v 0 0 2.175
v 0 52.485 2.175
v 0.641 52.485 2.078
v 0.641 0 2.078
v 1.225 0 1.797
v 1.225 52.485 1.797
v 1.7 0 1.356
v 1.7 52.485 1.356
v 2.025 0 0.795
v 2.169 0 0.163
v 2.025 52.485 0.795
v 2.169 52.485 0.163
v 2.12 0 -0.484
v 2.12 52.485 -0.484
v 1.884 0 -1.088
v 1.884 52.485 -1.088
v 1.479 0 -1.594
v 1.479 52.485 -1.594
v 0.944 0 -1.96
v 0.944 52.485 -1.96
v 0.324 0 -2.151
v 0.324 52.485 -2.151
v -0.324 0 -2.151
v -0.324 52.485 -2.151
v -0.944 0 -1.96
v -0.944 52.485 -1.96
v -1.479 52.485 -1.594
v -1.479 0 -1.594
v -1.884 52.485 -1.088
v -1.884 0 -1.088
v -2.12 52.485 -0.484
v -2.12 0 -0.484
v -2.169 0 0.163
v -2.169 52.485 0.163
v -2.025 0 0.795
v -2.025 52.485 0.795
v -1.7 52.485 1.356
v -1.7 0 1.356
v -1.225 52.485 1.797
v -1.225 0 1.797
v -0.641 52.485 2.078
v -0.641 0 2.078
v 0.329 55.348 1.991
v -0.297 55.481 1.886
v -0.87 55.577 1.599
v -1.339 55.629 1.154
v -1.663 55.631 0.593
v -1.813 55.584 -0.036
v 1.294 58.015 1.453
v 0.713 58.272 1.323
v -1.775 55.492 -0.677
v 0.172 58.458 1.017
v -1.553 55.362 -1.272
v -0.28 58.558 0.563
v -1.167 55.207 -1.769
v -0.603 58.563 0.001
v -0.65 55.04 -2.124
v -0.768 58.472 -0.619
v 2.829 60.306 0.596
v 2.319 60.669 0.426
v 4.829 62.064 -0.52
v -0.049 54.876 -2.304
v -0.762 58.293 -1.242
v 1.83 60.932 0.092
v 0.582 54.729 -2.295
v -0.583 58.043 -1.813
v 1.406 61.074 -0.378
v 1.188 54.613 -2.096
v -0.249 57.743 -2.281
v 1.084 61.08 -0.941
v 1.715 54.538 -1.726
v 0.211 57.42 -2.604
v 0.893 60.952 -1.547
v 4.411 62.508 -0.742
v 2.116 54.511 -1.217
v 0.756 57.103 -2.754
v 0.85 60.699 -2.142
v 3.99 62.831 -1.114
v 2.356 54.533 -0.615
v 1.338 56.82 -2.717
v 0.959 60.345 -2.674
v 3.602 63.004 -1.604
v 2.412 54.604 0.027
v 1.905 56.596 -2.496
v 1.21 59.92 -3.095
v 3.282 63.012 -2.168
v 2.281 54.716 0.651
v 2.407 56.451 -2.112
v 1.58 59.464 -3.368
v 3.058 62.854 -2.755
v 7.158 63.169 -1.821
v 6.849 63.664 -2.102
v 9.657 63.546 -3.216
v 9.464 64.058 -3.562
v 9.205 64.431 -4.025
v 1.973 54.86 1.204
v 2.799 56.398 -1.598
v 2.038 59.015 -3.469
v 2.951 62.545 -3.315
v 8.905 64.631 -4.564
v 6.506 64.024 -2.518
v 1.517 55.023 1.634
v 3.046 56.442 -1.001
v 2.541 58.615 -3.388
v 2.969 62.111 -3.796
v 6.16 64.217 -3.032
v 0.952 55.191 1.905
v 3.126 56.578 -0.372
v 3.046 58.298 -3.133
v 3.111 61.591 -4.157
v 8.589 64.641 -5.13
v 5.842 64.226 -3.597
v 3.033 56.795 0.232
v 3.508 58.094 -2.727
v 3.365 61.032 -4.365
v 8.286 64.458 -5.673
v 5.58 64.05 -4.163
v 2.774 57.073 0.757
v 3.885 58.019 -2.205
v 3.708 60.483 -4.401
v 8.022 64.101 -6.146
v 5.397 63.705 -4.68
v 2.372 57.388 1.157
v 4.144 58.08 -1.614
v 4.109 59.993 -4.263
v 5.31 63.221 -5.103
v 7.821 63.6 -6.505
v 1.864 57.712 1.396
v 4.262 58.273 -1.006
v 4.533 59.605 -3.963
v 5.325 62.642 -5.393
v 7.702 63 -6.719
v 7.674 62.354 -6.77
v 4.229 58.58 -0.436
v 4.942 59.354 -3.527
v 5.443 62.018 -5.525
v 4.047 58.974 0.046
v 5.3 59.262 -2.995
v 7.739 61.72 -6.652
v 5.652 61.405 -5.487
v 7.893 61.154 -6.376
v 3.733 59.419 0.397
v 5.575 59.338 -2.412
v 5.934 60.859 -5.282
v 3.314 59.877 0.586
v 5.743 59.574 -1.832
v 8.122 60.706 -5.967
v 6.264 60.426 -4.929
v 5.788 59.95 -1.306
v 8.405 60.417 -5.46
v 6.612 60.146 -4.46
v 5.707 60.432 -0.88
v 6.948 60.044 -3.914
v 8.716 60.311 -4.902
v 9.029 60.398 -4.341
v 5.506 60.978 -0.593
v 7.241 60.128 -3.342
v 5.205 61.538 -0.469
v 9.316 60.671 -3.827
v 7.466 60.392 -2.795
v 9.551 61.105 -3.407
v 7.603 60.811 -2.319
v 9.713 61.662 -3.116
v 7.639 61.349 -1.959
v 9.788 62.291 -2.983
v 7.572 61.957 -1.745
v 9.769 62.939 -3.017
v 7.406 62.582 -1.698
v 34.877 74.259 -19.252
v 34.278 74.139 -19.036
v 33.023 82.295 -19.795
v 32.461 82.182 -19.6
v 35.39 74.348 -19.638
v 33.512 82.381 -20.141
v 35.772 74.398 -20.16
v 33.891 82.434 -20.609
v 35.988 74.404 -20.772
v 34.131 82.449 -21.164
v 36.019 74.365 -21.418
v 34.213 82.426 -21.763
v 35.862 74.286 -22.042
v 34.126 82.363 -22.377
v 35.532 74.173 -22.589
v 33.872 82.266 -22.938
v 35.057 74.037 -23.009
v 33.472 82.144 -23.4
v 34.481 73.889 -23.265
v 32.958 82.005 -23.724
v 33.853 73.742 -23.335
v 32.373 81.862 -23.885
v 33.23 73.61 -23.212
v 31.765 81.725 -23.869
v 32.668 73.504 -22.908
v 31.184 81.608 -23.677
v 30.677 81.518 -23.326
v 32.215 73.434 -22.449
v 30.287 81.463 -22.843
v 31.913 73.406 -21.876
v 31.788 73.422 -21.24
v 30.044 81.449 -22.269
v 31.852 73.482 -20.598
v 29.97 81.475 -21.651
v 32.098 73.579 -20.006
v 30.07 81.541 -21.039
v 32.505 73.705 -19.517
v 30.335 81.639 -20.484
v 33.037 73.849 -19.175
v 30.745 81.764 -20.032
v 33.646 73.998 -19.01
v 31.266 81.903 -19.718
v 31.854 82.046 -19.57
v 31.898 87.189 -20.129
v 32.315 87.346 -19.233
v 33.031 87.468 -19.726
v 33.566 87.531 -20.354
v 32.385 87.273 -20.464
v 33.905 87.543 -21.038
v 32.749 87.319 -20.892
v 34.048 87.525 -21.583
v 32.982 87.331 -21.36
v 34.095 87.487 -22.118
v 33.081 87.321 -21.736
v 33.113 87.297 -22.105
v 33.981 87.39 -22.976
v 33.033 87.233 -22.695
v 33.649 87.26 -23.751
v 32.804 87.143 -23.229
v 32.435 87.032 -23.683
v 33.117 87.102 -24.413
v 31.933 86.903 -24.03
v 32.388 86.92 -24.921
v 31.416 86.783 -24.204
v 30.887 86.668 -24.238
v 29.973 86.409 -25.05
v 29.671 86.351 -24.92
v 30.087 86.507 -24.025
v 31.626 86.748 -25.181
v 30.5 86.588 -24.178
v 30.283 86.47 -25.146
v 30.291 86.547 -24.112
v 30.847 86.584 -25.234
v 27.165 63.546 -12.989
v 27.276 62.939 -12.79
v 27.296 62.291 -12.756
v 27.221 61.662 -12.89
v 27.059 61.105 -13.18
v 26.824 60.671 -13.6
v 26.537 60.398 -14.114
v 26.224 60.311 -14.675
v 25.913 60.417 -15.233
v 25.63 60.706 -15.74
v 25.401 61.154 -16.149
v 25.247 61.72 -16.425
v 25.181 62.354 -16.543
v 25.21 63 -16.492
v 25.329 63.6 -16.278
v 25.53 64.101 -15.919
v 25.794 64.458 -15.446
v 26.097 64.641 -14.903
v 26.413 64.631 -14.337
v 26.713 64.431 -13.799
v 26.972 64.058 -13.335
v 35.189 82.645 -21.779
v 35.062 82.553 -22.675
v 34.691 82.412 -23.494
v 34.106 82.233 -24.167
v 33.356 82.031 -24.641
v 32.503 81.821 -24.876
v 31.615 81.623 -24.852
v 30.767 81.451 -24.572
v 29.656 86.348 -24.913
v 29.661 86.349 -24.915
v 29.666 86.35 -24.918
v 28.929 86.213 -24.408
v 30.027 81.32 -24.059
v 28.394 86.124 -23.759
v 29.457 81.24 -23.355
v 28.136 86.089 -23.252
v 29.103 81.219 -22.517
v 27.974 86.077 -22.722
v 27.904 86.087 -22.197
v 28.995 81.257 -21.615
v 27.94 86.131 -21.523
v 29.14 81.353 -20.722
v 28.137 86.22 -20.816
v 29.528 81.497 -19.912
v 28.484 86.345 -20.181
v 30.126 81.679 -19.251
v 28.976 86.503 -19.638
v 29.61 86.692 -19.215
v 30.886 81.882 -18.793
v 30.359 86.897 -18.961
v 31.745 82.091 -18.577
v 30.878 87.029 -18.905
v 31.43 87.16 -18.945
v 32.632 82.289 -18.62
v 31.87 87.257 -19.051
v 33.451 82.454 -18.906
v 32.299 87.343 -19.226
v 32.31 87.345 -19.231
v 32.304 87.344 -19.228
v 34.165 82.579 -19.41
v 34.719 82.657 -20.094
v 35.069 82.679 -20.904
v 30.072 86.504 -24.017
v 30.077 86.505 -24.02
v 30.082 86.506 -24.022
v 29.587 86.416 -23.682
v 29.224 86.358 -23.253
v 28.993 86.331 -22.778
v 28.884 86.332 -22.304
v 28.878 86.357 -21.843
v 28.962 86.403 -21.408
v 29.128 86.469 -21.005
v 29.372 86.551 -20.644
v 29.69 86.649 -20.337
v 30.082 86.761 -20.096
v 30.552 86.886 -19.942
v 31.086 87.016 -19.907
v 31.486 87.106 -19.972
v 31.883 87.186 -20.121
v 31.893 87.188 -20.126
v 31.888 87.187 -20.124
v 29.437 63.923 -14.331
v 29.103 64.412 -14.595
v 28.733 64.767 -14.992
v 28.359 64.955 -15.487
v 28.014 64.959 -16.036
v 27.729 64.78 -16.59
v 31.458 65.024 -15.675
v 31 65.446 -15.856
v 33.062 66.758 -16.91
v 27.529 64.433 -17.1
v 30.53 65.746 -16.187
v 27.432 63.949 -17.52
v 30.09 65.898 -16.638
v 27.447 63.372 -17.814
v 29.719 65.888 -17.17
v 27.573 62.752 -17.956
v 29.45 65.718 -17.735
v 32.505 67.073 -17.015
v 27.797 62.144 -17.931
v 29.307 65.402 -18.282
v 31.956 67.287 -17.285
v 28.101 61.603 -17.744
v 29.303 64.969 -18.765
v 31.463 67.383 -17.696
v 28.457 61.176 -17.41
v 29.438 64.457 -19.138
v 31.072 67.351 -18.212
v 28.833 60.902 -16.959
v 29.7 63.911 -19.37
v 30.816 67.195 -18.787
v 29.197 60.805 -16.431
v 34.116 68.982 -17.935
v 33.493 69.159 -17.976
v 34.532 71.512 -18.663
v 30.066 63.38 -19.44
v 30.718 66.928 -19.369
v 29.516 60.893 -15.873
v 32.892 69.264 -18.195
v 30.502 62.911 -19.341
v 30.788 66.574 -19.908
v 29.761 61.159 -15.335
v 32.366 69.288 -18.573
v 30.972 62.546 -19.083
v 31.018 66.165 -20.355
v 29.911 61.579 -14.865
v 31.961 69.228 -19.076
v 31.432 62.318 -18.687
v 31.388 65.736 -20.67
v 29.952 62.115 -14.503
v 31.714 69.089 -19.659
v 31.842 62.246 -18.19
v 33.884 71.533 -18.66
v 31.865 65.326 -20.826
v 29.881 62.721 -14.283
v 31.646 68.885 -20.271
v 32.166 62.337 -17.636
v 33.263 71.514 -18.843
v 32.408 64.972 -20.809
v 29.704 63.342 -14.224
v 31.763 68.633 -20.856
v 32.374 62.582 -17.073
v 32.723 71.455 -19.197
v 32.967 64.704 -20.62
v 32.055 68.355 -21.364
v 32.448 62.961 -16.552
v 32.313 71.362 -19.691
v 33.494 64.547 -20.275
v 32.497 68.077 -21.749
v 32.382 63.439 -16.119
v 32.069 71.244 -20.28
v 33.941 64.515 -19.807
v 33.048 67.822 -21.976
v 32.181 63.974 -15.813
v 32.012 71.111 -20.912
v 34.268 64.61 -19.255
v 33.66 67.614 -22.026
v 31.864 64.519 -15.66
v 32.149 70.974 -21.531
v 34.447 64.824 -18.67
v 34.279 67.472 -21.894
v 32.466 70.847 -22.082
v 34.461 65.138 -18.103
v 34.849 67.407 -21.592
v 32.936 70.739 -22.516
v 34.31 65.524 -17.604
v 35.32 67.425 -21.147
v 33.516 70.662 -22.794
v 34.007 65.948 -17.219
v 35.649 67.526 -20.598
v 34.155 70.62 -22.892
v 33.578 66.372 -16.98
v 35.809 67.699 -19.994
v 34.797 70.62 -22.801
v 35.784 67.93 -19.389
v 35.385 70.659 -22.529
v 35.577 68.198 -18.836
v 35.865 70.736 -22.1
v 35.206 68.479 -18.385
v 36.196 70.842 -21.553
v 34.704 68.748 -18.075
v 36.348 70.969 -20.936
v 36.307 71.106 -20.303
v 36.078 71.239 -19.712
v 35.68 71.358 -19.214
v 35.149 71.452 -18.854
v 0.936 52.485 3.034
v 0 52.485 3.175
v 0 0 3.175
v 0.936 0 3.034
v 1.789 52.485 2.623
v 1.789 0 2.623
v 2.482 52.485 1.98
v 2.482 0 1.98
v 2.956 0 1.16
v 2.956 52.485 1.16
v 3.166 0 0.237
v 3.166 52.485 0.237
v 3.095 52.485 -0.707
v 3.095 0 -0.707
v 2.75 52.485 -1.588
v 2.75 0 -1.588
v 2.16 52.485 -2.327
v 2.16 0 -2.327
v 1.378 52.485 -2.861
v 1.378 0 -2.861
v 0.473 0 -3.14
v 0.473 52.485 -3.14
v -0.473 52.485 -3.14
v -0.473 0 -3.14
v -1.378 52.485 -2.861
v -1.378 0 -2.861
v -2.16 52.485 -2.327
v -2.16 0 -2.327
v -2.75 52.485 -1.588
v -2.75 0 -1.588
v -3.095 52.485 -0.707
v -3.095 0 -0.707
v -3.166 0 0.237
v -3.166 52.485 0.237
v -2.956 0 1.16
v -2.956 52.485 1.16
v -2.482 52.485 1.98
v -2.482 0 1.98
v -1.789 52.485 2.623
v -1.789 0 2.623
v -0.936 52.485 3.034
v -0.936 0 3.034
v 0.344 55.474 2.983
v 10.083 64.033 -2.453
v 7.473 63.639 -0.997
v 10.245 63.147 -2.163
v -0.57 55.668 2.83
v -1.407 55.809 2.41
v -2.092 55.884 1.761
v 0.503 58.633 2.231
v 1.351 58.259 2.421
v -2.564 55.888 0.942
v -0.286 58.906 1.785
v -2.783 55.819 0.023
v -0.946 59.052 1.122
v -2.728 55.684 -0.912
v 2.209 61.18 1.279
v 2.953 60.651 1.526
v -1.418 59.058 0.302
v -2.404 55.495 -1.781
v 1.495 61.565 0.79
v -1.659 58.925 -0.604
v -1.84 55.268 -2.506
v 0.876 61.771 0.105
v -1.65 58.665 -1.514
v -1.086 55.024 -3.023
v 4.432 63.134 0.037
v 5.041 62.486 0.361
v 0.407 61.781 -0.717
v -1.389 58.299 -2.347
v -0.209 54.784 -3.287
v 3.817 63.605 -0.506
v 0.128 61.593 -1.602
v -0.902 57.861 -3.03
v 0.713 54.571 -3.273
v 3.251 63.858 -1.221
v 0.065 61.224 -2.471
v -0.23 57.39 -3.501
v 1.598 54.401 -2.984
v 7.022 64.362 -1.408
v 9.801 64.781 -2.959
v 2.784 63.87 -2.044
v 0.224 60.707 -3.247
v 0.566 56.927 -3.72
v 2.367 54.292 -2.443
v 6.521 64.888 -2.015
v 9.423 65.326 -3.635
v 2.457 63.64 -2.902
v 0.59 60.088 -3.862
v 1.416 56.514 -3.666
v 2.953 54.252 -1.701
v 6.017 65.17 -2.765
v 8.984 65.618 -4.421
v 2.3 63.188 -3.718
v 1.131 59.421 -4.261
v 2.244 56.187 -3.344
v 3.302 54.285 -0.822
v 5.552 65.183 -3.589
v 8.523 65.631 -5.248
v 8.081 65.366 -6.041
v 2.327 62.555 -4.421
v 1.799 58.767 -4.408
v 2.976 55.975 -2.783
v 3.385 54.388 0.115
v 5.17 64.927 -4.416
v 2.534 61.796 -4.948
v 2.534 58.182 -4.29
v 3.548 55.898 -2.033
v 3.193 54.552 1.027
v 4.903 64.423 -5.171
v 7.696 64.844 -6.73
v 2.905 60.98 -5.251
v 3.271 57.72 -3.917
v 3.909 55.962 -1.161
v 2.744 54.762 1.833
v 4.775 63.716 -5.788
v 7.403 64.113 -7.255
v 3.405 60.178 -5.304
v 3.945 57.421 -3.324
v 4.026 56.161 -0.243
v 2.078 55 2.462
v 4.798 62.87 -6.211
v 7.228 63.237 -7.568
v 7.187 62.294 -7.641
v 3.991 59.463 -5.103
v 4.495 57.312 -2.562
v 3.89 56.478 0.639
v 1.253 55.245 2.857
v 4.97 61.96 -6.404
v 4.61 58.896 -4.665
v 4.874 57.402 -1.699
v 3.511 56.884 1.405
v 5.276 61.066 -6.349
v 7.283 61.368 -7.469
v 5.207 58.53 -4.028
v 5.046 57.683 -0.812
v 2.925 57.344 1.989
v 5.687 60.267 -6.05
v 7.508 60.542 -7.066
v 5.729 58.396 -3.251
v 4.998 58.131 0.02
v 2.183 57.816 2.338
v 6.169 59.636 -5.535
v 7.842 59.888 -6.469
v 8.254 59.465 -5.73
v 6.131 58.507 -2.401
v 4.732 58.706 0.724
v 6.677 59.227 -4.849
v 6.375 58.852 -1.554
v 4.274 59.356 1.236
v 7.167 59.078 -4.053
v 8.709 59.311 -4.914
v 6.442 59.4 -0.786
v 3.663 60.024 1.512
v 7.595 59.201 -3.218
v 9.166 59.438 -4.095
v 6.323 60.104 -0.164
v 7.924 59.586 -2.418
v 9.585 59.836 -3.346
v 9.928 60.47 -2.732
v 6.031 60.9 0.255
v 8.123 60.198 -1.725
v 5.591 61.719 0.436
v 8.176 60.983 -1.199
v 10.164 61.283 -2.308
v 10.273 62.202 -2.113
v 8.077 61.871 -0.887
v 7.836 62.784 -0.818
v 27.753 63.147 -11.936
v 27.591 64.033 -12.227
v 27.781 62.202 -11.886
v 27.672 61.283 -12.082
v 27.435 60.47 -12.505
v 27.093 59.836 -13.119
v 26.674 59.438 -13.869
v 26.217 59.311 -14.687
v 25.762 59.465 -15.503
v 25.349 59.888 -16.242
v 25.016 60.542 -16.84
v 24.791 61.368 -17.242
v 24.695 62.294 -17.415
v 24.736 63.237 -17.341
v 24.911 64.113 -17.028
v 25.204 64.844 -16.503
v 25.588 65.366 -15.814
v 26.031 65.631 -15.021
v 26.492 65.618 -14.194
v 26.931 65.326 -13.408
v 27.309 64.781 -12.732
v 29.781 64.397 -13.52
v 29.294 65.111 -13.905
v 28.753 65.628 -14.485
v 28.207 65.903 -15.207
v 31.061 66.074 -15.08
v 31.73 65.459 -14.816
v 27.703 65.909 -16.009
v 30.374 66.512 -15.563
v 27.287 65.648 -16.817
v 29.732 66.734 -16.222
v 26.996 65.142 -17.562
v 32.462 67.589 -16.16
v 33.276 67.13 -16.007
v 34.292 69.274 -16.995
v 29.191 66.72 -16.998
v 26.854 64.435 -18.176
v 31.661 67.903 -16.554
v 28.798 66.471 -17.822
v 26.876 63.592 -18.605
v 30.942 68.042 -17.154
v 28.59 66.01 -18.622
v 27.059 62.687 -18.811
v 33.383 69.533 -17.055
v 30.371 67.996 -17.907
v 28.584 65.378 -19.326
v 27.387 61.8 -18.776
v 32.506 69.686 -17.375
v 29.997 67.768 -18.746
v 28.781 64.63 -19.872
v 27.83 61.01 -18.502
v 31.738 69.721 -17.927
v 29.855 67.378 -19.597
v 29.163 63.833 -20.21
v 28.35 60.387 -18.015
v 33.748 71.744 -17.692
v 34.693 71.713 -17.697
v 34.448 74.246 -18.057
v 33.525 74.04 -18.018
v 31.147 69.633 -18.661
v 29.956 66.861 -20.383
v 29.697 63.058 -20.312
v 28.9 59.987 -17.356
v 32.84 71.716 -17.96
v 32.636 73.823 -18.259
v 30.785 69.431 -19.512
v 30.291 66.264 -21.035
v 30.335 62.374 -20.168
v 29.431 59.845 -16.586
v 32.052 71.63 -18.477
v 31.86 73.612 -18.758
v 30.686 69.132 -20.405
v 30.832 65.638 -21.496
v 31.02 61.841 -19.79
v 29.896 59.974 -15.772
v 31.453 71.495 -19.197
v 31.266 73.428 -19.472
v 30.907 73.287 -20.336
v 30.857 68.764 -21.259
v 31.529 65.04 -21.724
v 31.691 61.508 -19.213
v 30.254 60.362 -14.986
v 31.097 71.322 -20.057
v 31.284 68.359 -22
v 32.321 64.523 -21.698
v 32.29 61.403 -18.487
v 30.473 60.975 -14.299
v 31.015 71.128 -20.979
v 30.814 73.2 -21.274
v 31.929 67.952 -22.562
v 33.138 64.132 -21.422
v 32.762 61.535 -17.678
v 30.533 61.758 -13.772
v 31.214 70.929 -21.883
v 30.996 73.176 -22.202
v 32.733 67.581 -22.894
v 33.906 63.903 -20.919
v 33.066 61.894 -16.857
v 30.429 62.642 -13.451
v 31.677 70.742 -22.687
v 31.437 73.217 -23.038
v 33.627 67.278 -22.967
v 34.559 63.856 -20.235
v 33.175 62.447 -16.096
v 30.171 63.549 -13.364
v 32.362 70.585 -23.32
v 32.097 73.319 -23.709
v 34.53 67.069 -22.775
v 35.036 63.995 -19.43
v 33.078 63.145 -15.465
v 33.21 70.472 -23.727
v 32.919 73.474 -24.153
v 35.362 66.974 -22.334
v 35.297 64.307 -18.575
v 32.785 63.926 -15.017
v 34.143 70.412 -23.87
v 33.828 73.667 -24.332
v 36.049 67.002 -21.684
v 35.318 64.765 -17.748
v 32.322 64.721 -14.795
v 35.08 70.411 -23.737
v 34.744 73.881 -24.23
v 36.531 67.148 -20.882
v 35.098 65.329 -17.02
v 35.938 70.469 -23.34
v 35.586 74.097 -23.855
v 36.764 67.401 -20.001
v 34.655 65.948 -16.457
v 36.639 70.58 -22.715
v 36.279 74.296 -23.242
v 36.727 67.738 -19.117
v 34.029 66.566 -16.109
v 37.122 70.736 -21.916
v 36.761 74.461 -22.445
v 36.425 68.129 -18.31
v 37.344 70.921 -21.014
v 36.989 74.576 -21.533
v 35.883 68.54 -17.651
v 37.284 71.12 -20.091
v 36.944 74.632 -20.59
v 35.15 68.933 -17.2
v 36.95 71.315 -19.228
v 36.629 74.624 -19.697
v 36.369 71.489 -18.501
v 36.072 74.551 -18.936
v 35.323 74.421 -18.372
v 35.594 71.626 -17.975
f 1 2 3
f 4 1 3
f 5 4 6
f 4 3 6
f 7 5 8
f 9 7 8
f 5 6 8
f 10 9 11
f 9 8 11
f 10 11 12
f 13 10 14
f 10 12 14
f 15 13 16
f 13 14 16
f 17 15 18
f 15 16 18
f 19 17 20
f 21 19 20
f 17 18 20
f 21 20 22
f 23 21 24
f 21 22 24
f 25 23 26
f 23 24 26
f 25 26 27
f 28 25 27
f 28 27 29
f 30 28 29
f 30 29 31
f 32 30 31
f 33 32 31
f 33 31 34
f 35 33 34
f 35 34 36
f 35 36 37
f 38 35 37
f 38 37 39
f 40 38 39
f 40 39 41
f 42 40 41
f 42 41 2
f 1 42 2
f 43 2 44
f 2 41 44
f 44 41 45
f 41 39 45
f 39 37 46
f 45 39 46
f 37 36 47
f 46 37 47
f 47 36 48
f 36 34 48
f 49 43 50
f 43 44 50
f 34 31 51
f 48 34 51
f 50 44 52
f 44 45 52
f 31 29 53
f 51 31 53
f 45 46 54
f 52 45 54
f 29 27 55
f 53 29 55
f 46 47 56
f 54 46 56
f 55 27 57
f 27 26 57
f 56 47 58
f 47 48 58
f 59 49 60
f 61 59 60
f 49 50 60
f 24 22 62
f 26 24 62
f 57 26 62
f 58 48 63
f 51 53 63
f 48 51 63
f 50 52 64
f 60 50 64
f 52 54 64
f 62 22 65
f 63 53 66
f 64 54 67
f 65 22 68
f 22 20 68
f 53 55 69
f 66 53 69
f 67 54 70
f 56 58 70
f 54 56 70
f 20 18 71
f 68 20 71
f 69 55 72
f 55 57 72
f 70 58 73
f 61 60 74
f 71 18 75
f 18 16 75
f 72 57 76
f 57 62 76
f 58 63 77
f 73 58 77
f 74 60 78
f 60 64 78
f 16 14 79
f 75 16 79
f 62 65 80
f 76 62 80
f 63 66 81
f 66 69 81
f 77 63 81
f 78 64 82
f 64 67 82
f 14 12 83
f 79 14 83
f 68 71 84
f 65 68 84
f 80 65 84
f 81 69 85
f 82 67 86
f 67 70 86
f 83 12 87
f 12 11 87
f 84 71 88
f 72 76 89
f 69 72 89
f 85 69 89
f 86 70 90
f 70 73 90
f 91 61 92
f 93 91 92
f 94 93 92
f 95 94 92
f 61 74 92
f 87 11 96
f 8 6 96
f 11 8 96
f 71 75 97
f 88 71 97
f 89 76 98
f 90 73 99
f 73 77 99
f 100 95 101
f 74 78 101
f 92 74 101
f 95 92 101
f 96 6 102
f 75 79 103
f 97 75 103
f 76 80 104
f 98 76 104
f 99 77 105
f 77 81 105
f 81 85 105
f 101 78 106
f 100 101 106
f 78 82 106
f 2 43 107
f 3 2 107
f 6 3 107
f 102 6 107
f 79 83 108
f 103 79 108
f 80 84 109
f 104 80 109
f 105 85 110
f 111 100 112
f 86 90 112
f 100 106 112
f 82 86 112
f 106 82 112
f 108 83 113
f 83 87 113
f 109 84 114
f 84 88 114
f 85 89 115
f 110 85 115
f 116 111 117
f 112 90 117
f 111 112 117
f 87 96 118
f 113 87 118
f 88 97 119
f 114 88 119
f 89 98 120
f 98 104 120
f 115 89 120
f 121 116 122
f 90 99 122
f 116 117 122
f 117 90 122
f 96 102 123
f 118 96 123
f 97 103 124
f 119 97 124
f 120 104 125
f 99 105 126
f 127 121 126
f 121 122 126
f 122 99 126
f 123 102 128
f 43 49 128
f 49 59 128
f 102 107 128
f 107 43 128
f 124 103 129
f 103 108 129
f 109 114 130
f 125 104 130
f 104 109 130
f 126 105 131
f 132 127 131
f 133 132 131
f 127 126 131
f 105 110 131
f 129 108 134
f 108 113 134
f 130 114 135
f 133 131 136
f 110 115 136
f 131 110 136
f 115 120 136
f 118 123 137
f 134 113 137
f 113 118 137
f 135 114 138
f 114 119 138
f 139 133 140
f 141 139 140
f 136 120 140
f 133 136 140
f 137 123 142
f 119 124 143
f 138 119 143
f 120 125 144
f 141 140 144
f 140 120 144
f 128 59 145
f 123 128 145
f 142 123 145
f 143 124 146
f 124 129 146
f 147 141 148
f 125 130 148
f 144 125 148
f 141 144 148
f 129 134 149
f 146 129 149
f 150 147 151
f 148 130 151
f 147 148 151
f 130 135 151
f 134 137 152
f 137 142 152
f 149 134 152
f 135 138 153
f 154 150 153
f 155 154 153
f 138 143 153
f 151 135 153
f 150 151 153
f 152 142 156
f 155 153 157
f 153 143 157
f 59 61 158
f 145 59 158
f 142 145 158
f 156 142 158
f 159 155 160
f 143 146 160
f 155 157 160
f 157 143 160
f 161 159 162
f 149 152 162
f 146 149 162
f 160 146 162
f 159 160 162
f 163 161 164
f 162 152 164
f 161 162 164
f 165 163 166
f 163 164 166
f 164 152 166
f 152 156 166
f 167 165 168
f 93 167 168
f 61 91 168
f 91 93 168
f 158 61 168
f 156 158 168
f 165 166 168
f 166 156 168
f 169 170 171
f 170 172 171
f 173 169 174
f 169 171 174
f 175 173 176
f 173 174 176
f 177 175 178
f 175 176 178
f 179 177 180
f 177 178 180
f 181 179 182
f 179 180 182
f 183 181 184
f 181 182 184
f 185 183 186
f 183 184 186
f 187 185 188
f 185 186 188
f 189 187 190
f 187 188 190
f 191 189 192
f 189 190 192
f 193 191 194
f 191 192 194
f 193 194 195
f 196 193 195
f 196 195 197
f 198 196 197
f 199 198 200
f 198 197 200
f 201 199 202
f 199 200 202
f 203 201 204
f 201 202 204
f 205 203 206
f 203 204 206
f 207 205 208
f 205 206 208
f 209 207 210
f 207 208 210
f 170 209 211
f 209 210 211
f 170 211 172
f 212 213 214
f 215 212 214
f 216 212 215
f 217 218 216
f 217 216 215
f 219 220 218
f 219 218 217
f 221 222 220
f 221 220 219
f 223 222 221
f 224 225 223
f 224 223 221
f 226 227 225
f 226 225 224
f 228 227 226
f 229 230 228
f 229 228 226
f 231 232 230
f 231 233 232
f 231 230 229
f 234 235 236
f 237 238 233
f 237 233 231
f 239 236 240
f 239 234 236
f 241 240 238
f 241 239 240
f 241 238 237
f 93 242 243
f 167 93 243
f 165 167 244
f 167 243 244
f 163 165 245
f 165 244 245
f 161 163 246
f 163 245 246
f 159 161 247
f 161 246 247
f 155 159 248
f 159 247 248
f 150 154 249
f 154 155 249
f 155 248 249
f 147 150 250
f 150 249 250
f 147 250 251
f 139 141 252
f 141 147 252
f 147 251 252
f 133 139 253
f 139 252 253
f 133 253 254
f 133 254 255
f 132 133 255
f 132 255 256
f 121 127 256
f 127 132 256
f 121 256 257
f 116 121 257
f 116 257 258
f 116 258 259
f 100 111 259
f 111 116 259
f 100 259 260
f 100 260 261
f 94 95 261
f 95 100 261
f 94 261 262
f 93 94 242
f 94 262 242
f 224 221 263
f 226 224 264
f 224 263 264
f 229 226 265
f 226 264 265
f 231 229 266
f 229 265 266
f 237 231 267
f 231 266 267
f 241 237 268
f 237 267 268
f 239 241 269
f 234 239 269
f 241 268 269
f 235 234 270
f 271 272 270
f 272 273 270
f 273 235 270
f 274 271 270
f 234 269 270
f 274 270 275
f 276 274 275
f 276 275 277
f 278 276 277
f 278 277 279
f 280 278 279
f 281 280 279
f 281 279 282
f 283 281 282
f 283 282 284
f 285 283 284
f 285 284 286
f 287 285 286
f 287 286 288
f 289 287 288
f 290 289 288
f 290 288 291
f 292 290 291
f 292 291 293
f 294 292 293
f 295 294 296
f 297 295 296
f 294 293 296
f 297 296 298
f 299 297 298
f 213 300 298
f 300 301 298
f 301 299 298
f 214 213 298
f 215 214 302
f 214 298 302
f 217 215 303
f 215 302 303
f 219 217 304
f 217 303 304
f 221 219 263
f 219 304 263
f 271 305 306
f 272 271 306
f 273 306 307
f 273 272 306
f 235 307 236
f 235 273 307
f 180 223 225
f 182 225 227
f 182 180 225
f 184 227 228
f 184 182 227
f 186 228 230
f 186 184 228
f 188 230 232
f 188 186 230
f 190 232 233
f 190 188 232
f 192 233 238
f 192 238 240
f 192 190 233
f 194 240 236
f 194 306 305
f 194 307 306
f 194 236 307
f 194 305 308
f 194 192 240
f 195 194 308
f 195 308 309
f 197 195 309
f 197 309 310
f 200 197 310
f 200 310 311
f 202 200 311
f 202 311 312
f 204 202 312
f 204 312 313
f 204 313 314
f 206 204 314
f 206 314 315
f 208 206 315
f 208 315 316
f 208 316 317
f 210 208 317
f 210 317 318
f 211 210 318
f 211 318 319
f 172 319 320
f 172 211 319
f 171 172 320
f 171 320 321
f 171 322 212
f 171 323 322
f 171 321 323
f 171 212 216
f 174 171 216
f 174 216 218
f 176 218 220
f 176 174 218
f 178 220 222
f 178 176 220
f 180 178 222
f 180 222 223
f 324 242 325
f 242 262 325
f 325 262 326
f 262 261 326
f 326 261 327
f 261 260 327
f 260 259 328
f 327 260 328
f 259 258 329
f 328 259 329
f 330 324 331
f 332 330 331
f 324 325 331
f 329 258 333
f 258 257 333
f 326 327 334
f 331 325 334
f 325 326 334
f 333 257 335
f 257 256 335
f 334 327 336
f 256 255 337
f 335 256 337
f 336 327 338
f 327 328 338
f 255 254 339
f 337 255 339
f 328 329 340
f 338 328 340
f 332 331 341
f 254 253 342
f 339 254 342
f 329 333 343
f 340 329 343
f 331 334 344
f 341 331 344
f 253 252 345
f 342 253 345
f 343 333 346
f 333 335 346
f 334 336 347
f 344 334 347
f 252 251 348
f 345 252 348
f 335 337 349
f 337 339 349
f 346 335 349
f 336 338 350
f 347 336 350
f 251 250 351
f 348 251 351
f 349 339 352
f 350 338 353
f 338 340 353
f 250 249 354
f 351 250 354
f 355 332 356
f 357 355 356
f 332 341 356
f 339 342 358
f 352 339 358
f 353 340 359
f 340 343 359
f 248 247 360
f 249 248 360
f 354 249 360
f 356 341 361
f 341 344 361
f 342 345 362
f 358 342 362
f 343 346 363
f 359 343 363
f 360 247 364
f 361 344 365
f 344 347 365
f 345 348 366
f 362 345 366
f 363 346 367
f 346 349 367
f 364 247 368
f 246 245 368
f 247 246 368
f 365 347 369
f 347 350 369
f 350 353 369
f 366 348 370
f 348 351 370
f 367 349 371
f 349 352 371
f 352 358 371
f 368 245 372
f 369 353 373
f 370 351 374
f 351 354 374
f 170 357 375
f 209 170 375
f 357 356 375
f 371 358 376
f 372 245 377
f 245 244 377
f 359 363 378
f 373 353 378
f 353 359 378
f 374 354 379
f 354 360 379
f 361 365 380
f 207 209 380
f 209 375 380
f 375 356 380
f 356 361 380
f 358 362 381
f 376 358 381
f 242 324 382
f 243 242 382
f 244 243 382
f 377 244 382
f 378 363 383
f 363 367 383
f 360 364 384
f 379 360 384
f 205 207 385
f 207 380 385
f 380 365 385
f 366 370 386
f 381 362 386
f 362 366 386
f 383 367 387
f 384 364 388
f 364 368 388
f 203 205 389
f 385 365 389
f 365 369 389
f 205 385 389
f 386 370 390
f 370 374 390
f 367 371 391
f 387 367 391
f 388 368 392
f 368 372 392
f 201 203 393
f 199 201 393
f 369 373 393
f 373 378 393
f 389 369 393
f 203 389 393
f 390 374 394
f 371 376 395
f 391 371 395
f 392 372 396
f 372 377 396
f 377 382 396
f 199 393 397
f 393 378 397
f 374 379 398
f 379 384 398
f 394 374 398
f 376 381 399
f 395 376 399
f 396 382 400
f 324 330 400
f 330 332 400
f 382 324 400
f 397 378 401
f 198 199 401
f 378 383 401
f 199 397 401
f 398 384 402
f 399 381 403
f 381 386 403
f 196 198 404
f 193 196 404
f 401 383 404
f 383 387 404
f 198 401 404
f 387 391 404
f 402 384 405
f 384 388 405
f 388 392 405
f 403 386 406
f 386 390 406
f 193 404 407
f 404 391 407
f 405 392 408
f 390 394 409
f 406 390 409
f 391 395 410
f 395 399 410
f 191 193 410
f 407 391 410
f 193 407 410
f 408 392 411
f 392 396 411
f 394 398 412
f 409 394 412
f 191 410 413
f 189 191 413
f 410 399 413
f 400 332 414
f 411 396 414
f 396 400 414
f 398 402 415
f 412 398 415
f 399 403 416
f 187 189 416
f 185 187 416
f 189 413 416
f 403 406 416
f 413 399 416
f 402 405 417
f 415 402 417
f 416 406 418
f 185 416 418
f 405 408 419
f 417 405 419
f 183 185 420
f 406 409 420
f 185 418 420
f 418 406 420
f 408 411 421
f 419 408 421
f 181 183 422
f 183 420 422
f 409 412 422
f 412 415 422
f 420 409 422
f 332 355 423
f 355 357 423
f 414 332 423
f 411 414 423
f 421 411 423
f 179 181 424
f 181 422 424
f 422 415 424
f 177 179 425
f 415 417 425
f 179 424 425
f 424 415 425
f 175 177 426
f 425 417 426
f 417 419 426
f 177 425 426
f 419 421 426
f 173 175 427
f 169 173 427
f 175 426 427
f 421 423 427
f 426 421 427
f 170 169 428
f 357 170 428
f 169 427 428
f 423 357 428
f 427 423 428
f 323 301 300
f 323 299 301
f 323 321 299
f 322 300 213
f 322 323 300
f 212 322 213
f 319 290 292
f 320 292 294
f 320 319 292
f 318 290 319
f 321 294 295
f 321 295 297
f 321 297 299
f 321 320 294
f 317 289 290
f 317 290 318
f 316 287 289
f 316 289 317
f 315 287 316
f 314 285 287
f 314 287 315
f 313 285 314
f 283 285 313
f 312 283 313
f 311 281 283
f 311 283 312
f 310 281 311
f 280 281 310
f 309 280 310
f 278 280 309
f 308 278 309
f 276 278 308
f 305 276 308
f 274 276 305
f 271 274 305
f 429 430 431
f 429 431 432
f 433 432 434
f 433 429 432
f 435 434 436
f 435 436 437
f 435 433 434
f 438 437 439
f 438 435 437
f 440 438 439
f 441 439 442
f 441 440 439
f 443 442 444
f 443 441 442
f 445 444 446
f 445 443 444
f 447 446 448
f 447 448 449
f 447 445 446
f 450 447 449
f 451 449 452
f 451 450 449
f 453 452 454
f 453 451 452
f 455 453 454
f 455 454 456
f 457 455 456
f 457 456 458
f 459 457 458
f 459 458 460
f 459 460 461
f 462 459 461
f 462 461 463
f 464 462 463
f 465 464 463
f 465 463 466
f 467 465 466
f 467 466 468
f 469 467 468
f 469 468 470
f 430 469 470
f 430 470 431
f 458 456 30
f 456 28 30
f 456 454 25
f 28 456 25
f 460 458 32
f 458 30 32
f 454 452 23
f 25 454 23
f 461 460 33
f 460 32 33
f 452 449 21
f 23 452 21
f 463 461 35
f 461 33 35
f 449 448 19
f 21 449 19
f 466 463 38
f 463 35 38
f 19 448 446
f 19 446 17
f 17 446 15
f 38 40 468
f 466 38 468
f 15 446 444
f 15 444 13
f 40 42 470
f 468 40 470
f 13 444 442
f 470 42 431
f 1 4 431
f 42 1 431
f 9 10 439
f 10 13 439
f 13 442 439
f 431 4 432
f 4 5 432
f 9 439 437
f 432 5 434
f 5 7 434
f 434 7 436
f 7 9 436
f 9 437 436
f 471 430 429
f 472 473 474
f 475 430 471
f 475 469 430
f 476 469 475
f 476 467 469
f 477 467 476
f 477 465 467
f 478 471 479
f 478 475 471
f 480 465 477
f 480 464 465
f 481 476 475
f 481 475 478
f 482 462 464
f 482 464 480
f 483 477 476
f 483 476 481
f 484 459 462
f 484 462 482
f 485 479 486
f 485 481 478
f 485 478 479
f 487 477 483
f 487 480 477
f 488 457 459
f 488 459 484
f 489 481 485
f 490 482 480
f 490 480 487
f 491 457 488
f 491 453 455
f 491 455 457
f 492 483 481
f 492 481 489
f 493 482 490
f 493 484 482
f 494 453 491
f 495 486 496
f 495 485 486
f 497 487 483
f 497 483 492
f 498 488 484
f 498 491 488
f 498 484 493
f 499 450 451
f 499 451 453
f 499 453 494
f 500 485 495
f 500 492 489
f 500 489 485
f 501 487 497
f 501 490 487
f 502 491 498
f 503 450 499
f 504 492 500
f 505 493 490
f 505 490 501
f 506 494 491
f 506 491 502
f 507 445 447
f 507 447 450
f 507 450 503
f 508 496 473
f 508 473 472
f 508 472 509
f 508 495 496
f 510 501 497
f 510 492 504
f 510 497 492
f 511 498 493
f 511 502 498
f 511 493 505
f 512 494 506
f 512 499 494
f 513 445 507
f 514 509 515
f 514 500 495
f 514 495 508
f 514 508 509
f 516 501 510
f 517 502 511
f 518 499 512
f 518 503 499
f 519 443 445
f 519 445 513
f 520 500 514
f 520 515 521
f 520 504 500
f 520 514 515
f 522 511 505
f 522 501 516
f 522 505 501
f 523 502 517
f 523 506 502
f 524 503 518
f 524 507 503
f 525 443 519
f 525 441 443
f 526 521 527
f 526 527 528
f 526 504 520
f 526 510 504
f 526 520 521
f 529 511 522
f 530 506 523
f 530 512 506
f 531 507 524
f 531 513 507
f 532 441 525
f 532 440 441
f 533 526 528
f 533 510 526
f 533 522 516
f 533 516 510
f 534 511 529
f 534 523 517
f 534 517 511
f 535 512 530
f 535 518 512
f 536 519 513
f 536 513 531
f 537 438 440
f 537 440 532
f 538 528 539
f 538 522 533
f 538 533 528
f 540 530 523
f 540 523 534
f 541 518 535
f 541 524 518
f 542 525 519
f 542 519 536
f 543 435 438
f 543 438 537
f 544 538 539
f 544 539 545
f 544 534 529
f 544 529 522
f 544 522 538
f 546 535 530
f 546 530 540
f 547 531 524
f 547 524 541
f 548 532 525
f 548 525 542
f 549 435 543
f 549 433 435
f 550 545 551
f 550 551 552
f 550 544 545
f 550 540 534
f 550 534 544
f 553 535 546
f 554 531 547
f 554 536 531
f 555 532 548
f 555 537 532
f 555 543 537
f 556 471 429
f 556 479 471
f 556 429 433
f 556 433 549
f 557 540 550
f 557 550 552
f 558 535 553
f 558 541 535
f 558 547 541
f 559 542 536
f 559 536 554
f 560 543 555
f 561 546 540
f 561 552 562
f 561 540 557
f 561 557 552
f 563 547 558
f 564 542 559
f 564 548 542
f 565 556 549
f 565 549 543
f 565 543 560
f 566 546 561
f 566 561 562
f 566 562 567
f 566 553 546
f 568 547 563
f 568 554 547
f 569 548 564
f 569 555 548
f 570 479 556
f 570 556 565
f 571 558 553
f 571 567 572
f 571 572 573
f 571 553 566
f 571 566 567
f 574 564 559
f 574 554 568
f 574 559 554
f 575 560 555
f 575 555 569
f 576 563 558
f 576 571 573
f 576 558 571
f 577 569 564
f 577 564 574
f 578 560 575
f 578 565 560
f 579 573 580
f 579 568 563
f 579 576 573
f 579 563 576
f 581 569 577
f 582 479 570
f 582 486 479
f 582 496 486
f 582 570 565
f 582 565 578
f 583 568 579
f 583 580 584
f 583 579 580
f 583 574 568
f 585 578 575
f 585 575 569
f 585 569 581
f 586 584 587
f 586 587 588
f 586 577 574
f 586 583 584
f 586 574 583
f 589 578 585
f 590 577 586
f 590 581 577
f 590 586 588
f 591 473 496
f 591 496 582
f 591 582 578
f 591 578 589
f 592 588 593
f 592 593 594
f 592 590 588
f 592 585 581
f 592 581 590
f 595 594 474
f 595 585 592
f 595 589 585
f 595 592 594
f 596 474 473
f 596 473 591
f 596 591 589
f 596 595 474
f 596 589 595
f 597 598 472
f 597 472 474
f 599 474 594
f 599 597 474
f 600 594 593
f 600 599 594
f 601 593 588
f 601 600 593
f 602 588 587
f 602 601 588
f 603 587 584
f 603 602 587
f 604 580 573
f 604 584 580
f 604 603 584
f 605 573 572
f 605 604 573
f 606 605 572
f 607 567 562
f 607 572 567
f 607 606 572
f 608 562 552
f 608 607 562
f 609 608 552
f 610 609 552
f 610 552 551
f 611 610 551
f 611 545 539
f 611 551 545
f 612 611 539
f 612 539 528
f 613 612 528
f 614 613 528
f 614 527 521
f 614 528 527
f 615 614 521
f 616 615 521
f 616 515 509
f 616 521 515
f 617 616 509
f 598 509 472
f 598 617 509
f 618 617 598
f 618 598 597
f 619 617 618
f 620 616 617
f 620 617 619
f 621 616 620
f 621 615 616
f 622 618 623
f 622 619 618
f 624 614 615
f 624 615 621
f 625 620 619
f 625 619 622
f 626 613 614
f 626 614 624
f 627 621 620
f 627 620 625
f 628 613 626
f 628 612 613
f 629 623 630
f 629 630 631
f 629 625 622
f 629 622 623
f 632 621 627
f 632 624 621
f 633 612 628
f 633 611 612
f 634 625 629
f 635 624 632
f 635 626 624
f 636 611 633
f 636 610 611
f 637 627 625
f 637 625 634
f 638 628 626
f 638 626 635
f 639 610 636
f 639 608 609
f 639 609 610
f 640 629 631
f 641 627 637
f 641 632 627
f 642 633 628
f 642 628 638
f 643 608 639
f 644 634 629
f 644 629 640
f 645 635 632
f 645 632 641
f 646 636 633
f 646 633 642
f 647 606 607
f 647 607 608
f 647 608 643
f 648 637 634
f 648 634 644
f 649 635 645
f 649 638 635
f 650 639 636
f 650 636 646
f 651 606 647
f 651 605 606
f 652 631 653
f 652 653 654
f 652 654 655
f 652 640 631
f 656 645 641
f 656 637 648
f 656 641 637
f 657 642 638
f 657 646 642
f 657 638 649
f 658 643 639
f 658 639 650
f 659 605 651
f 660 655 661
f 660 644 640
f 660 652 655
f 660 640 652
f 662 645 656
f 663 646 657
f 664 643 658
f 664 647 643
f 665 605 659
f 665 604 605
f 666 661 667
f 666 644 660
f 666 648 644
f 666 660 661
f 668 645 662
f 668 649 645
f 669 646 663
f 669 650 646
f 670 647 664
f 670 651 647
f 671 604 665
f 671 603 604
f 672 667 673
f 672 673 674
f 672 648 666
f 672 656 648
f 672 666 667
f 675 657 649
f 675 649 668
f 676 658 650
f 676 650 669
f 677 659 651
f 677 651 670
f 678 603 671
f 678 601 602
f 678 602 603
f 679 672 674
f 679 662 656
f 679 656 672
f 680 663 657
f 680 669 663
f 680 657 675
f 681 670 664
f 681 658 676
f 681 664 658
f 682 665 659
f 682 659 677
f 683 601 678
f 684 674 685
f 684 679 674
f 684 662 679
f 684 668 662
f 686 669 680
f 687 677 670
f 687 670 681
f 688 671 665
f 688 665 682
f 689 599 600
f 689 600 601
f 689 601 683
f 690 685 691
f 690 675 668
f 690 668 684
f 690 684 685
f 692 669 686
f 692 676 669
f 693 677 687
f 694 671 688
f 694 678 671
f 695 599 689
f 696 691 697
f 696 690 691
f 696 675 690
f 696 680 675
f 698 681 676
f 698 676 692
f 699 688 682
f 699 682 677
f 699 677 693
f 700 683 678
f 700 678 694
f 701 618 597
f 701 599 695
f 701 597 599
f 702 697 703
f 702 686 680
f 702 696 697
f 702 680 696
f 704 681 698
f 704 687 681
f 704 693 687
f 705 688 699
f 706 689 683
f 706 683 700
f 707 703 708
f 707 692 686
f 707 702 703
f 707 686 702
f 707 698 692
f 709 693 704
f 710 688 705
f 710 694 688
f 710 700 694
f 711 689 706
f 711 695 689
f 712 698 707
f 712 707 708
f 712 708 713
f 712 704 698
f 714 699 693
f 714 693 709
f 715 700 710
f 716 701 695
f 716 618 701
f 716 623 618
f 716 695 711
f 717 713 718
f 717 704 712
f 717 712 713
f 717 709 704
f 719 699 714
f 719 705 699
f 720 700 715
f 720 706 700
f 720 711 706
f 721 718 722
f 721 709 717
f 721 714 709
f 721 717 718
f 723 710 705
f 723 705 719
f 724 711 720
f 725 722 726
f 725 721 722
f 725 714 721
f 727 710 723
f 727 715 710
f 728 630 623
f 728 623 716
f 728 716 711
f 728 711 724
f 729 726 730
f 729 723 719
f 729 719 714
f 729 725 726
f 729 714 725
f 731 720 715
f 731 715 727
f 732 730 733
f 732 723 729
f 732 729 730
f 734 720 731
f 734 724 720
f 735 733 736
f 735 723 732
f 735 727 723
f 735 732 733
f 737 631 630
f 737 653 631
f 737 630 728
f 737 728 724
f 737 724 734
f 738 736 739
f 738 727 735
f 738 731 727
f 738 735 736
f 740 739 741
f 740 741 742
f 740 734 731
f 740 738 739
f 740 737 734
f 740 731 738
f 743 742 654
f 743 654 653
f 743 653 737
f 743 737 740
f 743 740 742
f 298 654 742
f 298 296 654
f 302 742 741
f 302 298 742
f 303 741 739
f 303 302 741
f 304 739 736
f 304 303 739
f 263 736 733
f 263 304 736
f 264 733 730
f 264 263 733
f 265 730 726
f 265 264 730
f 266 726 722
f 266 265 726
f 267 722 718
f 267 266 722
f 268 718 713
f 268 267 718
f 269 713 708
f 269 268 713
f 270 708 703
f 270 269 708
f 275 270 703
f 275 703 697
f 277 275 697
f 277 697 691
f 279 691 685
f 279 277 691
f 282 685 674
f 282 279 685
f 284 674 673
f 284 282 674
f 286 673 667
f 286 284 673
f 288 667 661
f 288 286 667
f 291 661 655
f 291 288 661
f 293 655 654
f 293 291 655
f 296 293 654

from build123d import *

# Parameters (mm, degrees)
SWEEP_THIN1_PROFILE_R     = 3.175
SWEEP_THIN1_PROFILE_R_2   = 2.175
BOSS_EXTRUDE1_OUTLINE_R   = 3.175
BOSS_EXTRUDE1_OUTLINE_R_2 = 2.175
BOSS_EXTRUDE1_DEPTH       = 5.033072262
BOSS_EXTRUDE1_START       = 3
BOSS_EXTRUDE1_2_DEPTH     = 8


with BuildPart() as part:
    # Sweep-Thin1: sweep along a curve in space
    with BuildLine() as sweep_thin1_path:
        Line((0, 0, 0), (0, 41.3, 0))
        Line((0, 41.3, 0), (0, 52.485381189, 0))
        ThreePointArc((8.731710823, 62.485381189, -4.874138499), (2.557458889, 59.556449001, -1.427602114), (0, 52.485381189, 0))
        Line((8.731710823, 62.485381189, -4.874138499), (26.239628077, 62.485381189, -14.647253442))
        ThreePointArc((26.239628077, 62.485381189, -14.647253442), (32.596698174, 65.949204532, -18.875029244), (33.90761411, 73.906143624, -21.166997899))
        Line((32.091284349, 81.948727145, -21.730096286), (33.90761411, 73.906143624, -21.166997899))
    # Sweep-Thin1 profile (on start of the path) → Sweep-Thin1 (sweep)
    with BuildSketch(Plane.ZX):
        Circle(SWEEP_THIN1_PROFILE_R)
        Circle(SWEEP_THIN1_PROFILE_R_2, mode=Mode.SUBTRACT)
    sweep(path=sweep_thin1_path.line)

    # Boss-Extrude1: read off the stored shape, not the designer's step
    # Boss-Extrude1 outline → Boss-Extrude1 (add)
    with BuildSketch(Plane(origin=(-16.302656388, 72.187043596, -5.054148045), x_dir=(0.9755496373305654, 0.2192425074835292, -0.015350179690706331), z_dir=(-0.21977921899989167, 0.973167297783081, -0.06813593340796047))):
        with Locations((49.606846115, 15.953433297)):
            Circle(BOSS_EXTRUDE1_OUTLINE_R)
        with Locations((49.606846115, 15.953433297)):
            Circle(BOSS_EXTRUDE1_OUTLINE_R_2, mode=Mode.SUBTRACT)
    extrude(amount=BOSS_EXTRUDE1_DEPTH)

    # Boss-Extrude1 2 outline → Boss-Extrude1 2 (cut)
    with BuildSketch(Plane(origin=(0, 0, 0), x_dir=(0.9092183851510403, -0.07176325268657005, -0.4100877511791569), z_dir=(0.41631950242972593, 0.156726908876634, 0.8956085908088649)).offset(BOSS_EXTRUDE1_START)):
        with BuildLine():
            ThreePointArc((30.991714154, 89.351616158), (32.537128586, 89.718539367), (34.090261078, 90.051282317))
            Line((34.090261078, 90.051282317), (35, 90.235713443))
            Line((35, 90.235713443), (35, 90.350121944))
            Line((35, 90.350121944), (34.072560393, 90.119086943))
            Line((34.072560393, 90.119086943), (30.991714154, 89.351616158))
        make_face()
        with BuildLine():
            ThreePointArc((27.927036801, 88.515957727), (29.454766368, 88.950690302), (30.991714154, 89.351616158))
            Line((30.991714154, 89.351616158), (27.910868159, 88.584144334))
            Line((27.910868159, 88.584144334), (27, 88.357237456))
            Line((27, 88.357237456), (27, 88.241069912))
            Line((27, 88.241069912), (27.927036801, 88.515957727))
        make_face()
    extrude(amount=BOSS_EXTRUDE1_2_DEPTH, mode=Mode.SUBTRACT)


solid = part.part
